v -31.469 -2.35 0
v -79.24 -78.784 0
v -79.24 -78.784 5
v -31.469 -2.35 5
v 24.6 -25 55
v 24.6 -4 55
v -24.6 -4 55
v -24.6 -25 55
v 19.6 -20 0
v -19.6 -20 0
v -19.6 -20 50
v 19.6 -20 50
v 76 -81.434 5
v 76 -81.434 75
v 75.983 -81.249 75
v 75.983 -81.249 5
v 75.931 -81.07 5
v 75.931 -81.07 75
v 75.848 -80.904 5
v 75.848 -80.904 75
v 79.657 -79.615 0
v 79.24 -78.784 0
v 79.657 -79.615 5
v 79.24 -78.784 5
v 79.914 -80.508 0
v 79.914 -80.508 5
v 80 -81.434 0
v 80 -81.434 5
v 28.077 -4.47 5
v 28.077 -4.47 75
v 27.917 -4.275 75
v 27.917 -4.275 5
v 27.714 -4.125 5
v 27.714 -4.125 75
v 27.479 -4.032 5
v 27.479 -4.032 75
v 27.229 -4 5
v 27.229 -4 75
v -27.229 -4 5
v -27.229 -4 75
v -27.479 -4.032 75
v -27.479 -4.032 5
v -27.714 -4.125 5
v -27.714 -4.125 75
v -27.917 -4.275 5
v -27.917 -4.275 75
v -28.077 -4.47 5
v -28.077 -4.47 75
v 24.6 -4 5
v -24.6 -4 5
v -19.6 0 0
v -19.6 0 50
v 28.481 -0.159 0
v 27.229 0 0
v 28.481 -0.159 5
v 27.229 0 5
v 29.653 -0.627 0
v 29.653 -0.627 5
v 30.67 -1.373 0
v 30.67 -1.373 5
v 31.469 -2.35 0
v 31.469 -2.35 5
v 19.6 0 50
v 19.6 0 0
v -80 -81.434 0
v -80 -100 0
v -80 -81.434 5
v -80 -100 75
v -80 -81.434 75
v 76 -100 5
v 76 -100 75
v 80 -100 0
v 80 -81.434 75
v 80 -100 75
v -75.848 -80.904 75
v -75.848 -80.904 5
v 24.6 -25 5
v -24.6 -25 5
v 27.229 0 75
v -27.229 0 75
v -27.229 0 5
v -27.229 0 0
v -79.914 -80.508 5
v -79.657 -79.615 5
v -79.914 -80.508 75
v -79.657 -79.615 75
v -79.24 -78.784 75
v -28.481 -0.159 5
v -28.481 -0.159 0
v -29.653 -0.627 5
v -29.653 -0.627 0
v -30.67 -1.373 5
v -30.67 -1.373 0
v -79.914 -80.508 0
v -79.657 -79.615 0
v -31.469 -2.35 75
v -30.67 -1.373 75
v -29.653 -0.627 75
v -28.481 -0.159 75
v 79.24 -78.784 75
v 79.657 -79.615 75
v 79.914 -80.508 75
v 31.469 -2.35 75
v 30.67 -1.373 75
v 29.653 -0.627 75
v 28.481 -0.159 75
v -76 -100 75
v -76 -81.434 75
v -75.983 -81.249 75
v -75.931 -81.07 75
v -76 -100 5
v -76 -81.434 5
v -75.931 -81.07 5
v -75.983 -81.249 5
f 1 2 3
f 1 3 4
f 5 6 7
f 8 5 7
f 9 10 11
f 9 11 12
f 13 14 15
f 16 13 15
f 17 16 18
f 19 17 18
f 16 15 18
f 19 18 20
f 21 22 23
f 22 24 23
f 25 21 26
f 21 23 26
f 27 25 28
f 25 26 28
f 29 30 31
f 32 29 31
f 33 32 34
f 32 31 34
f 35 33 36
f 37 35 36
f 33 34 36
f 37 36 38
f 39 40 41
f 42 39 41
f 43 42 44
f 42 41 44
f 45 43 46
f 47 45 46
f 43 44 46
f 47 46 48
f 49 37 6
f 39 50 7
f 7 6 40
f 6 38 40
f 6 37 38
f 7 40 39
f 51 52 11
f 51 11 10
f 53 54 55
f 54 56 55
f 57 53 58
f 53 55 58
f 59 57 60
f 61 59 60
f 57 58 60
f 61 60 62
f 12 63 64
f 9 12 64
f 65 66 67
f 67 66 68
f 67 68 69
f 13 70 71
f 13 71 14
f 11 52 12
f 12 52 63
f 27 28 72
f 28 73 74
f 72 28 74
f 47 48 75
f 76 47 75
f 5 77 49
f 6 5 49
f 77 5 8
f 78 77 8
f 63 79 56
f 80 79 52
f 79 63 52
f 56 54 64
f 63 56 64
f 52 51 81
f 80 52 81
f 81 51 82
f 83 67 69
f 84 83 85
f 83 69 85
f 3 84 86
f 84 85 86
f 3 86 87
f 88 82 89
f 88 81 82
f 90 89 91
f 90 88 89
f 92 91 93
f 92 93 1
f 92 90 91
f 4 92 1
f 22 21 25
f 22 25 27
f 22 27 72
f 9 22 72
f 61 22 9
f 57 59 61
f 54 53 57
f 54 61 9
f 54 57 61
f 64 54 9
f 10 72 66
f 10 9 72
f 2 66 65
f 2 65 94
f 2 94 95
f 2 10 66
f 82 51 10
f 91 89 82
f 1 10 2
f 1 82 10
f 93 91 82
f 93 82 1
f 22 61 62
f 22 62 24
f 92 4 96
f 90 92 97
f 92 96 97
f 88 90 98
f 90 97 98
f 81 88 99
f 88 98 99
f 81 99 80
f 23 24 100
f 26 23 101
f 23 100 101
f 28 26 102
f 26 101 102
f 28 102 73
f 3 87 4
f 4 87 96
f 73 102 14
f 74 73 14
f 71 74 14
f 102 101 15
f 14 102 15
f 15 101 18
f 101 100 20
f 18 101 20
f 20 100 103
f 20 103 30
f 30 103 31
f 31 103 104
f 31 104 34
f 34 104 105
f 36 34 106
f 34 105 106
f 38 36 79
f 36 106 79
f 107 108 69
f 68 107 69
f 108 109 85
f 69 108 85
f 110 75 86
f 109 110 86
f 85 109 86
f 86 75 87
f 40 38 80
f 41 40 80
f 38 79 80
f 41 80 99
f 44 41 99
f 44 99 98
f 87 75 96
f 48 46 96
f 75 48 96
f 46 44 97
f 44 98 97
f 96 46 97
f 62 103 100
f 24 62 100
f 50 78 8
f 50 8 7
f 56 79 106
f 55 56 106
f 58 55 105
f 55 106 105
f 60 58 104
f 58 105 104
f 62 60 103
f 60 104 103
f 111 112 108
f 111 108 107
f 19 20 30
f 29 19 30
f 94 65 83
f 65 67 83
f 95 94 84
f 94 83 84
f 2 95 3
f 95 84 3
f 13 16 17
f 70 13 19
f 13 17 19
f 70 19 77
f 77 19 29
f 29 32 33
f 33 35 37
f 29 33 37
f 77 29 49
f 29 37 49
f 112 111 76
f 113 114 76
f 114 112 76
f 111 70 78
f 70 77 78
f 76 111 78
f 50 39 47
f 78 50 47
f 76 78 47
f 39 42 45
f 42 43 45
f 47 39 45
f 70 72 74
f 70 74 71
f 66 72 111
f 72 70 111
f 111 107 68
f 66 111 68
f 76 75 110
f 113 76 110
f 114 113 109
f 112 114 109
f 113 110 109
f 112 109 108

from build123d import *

# Parameters (mm, degrees)
BOSS_EXTRUDE1_DEPTH = 5
FILLET1_R           = 5
FILLET2_R           = 5
FILLET3_R           = 5
FILLET4_R           = 5
BOSS_EXTRUDE2_START = 70
BOSS_EXTRUDE2_DEPTH = 70
SKETCH3_W           = 49.2
SKETCH3_H           = 25
BOSS_EXTRUDE3_DEPTH = 55
SKETCH4_W           = 39.2
SKETCH4_H           = 50
CUT_EXTRUDE1_DEPTH  = 20


with BuildPart() as part:
    # Sketch1 → Boss-Extrude1 (new body)
    with BuildSketch(Plane.XY):
        Polygon((-30, 0), (30, 0), (80, -80), (80, -100), (-80, -100), (-80, -80), align=None)
    extrude(amount=BOSS_EXTRUDE1_DEPTH)

    # Fillet1
    fillet1_edges = [part.edges().sort_by_distance(p)[0] for p in [
        (-30, 0, 2.5),
    ]]
    fillet(fillet1_edges, radius=FILLET1_R)

    # Fillet2
    fillet2_edges = [part.edges().sort_by_distance(p)[0] for p in [
        (30, 0, 2.5),
    ]]
    fillet(fillet2_edges, radius=FILLET2_R)

    # Fillet3
    fillet3_edges = [part.edges().sort_by_distance(p)[0] for p in [
        (80, -80, 2.5),
    ]]
    fillet(fillet3_edges, radius=FILLET3_R)

    # Fillet4
    fillet4_edges = [part.edges().sort_by_distance(p)[0] for p in [
        (-80, -80, 2.5),
    ]]
    fillet(fillet4_edges, radius=FILLET4_R)

    # Sketch2 → Boss-Extrude2 (add)
    with BuildSketch(Plane.XY.offset(5).offset(BOSS_EXTRUDE2_START)):
        with BuildLine():
            Line((76, -100), (76, -81.433981132))
            ThreePointArc((76, -81.433981132), (75.961248746, -81.158298619), (75.847998304, -80.903982192))
            Line((75.847998304, -80.903982192), (28.076760096, -4.47000106))
            ThreePointArc((28.076760096, -4.47000106), (27.713530325, -4.125357519), (27.228761792, -4))
            Line((27.228761792, -4), (-27.228761792, -4))
            ThreePointArc((-27.228761792, -4), (-27.713530325, -4.125357519), (-28.076760096, -4.47000106))
            Line((-28.076760096, -4.47000106), (-75.847998304, -80.903982192))
            ThreePointArc((-75.847998304, -80.903982192), (-75.961248746, -81.158298619), (-76, -81.433981132))
            Line((-76, -81.433981132), (-76, -100))
            Line((-76, -100), (-80, -100))
            Line((-80, -100), (-80, -81.433981132))
            ThreePointArc((-80, -81.433981132), (-79.806243731, -80.055568567), (-79.23999152, -78.783986432))
            Line((-79.23999152, -78.783986432), (-31.468753312, -2.3500053))
            ThreePointArc((-31.468753312, -2.3500053), (-29.652604454, -0.626787594), (-27.228761792, 0))
            Line((-27.228761792, 0), (27.228761792, 0))
            ThreePointArc((27.228761792, 0), (29.652604454, -0.626787594), (31.468753312, -2.3500053))
            Line((31.468753312, -2.3500053), (79.23999152, -78.783986432))
            ThreePointArc((79.23999152, -78.783986432), (79.806243731, -80.055568567), (80, -81.433981132))
            Line((80, -81.433981132), (80, -100))
            Line((80, -100), (76, -100))
        make_face()
    extrude(amount=-BOSS_EXTRUDE2_DEPTH)

    # Sketch3 → Boss-Extrude3 (add)
    with BuildSketch(Plane(origin=(0, 0, 0), x_dir=(-1, 0, 0), z_dir=(0, 0, -1))):
        with Locations((0, -12.5)):
            Rectangle(SKETCH3_W, SKETCH3_H)
    extrude(amount=-BOSS_EXTRUDE3_DEPTH)

    # Sketch4 → Cut-Extrude1 (cut)
    with BuildSketch(Plane(origin=(0, 0, 0), x_dir=(1, 0, 0), z_dir=(0, 1, 0))):
        with Locations((0, -25)):
            Rectangle(SKETCH4_W, SKETCH4_H)
    extrude(amount=-CUT_EXTRUDE1_DEPTH, mode=Mode.SUBTRACT)


solid = part.part
